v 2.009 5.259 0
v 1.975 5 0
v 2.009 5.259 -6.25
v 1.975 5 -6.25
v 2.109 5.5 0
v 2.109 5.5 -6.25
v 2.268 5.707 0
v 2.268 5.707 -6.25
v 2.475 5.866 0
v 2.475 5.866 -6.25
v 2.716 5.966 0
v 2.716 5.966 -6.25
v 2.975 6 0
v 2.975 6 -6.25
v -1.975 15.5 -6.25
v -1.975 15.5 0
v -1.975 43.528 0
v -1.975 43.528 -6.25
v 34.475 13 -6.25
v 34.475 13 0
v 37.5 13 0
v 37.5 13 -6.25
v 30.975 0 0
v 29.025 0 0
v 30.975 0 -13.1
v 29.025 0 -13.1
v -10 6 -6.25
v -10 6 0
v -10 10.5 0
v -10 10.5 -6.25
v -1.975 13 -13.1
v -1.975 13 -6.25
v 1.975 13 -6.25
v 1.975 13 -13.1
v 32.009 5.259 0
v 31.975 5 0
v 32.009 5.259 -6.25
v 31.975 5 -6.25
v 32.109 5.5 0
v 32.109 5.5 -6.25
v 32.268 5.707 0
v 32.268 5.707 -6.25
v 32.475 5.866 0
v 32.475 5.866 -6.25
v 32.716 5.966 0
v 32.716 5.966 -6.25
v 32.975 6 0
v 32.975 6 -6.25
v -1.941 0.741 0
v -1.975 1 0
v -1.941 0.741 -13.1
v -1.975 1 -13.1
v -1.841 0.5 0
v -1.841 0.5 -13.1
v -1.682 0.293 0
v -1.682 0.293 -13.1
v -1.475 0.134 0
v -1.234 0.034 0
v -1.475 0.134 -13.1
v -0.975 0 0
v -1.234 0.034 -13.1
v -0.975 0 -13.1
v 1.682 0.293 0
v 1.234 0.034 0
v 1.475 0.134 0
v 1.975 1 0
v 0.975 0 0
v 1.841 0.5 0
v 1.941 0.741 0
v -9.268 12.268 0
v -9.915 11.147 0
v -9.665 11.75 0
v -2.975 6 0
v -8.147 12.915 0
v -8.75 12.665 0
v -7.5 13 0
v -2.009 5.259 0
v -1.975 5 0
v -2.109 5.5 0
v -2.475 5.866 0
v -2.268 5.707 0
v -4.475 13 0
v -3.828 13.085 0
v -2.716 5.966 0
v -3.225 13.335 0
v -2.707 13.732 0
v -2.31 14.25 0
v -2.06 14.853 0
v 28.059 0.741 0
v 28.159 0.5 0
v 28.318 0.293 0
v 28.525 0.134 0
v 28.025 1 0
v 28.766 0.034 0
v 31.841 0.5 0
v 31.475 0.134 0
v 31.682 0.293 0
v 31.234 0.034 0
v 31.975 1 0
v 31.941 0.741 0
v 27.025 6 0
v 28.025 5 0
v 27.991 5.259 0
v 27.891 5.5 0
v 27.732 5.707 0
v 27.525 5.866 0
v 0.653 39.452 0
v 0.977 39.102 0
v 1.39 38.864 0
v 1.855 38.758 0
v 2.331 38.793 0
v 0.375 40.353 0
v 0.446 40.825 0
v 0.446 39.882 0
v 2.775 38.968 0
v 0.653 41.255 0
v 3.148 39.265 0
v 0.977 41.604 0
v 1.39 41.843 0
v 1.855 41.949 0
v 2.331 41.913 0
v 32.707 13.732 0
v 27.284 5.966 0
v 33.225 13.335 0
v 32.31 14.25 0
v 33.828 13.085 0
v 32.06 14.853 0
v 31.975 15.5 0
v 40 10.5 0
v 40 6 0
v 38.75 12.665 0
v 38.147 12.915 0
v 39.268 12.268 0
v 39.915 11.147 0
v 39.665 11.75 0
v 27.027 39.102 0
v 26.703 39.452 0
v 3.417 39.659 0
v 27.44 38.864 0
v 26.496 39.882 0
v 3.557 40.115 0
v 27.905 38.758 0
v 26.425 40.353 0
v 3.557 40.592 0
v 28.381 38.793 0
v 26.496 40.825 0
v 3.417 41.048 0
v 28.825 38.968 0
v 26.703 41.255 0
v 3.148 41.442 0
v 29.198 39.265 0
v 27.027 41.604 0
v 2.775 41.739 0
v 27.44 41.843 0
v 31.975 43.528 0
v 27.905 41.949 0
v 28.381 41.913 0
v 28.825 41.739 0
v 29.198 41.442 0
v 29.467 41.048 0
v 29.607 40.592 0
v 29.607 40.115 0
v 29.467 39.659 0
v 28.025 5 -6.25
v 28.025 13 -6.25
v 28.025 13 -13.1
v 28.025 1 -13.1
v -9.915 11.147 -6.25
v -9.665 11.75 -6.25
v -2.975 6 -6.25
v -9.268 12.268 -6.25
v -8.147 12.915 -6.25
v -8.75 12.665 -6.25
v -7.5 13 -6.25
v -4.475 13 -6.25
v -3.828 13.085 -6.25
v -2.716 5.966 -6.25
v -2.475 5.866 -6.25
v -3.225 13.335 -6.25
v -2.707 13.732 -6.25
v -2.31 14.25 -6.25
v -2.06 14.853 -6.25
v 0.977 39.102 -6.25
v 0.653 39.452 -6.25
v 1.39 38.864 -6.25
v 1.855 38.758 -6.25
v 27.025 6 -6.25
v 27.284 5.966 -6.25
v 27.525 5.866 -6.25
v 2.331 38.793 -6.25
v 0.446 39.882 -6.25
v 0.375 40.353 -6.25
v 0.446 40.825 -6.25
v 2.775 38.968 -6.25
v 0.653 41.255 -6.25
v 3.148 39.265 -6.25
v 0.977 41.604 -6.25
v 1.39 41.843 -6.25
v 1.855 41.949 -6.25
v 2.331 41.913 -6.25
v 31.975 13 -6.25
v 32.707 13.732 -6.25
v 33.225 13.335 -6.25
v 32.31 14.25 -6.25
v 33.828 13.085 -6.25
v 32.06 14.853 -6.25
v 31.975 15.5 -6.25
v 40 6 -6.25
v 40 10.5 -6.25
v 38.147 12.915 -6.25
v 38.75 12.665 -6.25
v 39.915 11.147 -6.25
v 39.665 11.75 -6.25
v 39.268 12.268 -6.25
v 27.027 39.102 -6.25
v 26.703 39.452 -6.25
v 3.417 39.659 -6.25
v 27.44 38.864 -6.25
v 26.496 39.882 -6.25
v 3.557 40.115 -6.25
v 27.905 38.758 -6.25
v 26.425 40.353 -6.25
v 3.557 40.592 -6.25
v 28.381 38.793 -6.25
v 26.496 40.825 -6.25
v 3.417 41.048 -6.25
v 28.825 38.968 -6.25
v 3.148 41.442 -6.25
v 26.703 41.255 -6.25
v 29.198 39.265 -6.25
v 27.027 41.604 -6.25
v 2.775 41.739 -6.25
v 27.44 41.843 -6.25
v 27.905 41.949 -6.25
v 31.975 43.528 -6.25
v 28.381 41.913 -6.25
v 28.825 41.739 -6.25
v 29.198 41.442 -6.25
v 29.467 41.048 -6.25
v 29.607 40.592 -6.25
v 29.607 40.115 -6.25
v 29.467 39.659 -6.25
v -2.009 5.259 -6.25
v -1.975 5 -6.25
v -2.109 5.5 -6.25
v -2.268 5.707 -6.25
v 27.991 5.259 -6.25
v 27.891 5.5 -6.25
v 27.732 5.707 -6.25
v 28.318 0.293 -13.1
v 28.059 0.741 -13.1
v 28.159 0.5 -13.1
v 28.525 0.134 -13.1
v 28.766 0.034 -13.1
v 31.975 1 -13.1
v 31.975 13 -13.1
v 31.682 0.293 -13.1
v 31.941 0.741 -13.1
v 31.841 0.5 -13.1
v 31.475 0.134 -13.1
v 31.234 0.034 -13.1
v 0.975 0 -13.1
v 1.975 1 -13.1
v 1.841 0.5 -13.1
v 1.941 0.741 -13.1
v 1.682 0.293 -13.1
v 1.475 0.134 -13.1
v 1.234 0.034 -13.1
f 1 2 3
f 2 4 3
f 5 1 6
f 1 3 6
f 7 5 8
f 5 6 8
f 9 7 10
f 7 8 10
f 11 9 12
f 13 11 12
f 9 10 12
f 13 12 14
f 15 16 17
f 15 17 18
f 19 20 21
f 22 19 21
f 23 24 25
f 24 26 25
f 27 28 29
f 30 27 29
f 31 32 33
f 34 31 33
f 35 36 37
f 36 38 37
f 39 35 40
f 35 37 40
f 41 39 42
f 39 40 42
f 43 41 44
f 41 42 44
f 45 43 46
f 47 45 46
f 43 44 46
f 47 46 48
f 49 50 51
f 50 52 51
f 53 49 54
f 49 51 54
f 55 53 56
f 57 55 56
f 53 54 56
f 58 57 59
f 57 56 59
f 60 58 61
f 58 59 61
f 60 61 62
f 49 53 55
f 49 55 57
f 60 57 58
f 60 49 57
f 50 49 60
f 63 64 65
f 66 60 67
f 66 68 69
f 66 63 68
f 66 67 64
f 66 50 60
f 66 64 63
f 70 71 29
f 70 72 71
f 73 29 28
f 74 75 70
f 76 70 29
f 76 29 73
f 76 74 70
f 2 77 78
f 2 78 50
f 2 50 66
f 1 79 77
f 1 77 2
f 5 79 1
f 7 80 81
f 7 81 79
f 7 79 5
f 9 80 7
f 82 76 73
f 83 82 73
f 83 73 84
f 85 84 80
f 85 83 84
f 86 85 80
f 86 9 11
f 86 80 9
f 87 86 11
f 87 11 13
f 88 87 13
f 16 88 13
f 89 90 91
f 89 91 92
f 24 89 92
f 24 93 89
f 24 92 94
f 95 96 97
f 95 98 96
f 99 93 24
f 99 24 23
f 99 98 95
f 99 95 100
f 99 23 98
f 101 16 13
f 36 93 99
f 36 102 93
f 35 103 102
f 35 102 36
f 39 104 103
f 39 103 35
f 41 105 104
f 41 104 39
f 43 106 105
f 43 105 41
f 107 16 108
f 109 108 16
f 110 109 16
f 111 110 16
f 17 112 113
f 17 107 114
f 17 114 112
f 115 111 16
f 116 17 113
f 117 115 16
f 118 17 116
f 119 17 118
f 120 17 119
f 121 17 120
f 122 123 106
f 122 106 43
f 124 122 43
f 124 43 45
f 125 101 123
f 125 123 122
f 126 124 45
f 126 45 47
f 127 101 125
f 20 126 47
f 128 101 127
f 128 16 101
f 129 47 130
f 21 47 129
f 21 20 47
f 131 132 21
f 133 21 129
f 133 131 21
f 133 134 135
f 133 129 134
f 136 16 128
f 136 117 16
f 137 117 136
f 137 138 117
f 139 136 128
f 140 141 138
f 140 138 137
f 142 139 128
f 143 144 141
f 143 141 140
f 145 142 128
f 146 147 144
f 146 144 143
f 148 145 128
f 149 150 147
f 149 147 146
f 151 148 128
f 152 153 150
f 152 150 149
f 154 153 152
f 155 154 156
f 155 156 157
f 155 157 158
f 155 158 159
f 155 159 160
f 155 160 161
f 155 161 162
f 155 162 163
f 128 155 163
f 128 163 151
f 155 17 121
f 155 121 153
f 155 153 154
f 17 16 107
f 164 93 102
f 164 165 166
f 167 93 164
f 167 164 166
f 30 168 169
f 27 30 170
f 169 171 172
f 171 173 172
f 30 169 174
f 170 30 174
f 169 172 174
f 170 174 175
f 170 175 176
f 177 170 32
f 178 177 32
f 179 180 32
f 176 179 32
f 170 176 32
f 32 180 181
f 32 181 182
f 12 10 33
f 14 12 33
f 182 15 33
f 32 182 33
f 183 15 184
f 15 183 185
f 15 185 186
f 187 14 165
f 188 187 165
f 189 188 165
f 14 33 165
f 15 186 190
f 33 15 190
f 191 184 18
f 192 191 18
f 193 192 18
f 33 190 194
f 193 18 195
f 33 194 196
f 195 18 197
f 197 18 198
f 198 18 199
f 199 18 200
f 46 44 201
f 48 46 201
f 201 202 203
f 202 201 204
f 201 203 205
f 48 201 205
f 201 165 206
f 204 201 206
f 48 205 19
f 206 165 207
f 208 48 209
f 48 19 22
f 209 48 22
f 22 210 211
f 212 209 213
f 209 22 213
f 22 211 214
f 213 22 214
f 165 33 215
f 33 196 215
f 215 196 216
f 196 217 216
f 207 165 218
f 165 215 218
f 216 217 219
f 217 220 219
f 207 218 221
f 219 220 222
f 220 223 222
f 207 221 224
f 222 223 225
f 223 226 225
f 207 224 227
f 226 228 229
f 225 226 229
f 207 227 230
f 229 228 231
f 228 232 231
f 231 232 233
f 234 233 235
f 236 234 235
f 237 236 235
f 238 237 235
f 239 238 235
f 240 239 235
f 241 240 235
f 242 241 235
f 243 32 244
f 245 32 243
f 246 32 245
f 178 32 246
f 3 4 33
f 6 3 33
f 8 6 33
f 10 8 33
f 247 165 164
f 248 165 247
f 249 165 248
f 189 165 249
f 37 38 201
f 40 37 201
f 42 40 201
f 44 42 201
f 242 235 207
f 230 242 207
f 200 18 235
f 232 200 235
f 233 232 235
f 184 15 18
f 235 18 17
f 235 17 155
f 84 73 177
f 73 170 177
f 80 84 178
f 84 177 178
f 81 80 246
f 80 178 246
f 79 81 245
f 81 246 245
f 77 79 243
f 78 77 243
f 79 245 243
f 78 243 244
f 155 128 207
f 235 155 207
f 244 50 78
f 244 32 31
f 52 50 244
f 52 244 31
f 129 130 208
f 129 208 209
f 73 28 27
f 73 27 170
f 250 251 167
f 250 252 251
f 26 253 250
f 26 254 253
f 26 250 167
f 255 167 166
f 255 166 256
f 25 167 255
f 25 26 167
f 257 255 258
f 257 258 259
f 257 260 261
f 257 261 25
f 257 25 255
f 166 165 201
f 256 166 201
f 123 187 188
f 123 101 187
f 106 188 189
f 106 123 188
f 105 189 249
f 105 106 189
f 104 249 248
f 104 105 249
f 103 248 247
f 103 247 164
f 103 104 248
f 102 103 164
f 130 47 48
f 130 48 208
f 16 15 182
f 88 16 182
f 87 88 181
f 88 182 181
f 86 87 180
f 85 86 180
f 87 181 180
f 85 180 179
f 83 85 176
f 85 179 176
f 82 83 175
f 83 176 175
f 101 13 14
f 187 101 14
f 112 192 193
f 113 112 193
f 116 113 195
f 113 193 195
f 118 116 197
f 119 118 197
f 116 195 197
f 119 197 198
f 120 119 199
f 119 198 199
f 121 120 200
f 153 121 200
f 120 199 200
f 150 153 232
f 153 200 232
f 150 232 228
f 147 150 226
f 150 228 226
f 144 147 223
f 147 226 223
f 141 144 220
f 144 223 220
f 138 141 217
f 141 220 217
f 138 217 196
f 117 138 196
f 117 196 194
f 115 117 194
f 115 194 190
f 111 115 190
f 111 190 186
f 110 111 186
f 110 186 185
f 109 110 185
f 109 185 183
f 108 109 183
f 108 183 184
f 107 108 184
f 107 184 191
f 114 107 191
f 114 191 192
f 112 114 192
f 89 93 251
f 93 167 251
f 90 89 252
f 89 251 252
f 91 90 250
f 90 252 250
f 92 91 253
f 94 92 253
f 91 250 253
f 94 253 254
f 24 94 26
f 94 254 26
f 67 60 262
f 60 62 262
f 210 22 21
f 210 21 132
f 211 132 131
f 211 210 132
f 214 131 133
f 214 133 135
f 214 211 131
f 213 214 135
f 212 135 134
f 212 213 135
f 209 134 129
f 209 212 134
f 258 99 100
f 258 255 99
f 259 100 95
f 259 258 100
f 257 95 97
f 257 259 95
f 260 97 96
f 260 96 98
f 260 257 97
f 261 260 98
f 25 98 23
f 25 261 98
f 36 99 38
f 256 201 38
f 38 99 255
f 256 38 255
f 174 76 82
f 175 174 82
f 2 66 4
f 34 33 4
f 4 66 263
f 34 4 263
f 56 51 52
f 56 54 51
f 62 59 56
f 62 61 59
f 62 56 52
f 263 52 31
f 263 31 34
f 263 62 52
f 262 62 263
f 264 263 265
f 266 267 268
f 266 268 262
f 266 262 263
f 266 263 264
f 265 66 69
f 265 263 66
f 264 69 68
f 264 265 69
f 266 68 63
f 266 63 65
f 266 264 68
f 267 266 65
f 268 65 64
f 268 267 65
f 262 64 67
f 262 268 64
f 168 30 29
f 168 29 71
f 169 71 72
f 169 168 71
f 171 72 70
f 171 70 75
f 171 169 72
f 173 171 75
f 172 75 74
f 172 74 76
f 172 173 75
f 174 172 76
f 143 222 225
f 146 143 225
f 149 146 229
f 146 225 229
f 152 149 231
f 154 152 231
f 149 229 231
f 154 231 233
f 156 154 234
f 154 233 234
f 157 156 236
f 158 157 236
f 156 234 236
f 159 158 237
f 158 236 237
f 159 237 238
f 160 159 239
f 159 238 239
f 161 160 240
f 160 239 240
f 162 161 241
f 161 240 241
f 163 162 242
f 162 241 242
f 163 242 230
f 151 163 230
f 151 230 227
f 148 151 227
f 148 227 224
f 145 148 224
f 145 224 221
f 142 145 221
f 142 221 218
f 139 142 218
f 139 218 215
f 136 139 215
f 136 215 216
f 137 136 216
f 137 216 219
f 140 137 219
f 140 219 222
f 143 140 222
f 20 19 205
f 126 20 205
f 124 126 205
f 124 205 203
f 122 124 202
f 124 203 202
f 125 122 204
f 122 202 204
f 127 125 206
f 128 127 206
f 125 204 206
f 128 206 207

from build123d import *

# Parameters (mm, degrees)
SKETCH1_W                  = 3.95
SKETCH1_H                  = 13.1
BOSS_EXTRUDE1_DEPTH        = 13
SKETCH2_W                  = 3.95
SKETCH2_H                  = 13.1
BOSS_EXTRUDE2_DEPTH        = 13
BOSS_EXTRUDE3_REACH        = 37.222
SKETCH3_W                  = 6.25
SKETCH3_H                  = 7
SKETCH10_W                 = 8.025
SKETCH10_H                 = 7
BOSS_EXTRUDE7_DEPTH        = 6.25
FILLET7_R                  = 1
SKETCH11_W                 = 33.95
SKETCH11_H                 = 6.25
BOSS_EXTRUDE8_DEPTH        = 30.5283
F_3_2_3_2_DIAMETER_HOLE1_D = 3.2
FILLET8_START              = -7
FILLET8_DEPTH              = 8
FILLET8_START_2            = -6.25
FILLET8_2_DEPTH            = 6.25
FILLET9_R                  = 1


with BuildPart() as part:
    # Sketch1 → Boss-Extrude1 (new body)
    with BuildSketch(Plane(origin=(0, 0, 0), x_dir=(1, 0, 0), z_dir=(0, 1, 0))):
        with Locations((0, 6.55)):
            Rectangle(SKETCH1_W, SKETCH1_H)
    extrude(amount=BOSS_EXTRUDE1_DEPTH)


with BuildPart() as body_2:
    # Sketch2 → Boss-Extrude2 (new body)
    with BuildSketch(Plane(origin=(0, 0, 0), x_dir=(1, 0, 0), z_dir=(0, 1, 0))):
        with Locations((30, 6.55)):
            Rectangle(SKETCH2_W, SKETCH2_H)
    extrude(amount=BOSS_EXTRUDE2_DEPTH)

    # Sketch3 → Boss-Extrude3 (add, up to next)
    with BuildSketch(Plane(origin=(1.975, 0, 0), x_dir=(0, 0, -1), z_dir=(1, 0, 0)), mode=Mode.PRIVATE) as boss_extrude3_sk1:
        with Locations((3.125, 9.5)):
            Rectangle(SKETCH3_W, SKETCH3_H)
    boss_extrude3_tool1 = extrude(boss_extrude3_sk1.sketch, amount=BOSS_EXTRUDE3_REACH, mode=Mode.PRIVATE) - body_2.part

    add(part.part)  # Boss-Extrude3 merges part
    add(boss_extrude3_tool1.solids().sort_by_distance((1.975, 9.5, -3.125))[0])

    # Sketch10 → Boss-Extrude7 (add)
    with BuildSketch(Plane.XY):
        with Locations((-5.9875, 9.5)):
            Rectangle(SKETCH10_W, SKETCH10_H)
        with Locations((35.9875, 9.5)):
            Rectangle(SKETCH10_W, SKETCH10_H)
    extrude(amount=-BOSS_EXTRUDE7_DEPTH)

    # Fillet7
    fillet7_edges = [body_2.edges().sort_by_distance(p)[0] for p in [
        (28.025, 0, -6.55),
        (31.975, 0, -6.55),
        (1.975, 0, -6.55),
        (-1.975, 0, -6.55),
    ]]
    fillet(fillet7_edges, radius=FILLET7_R)

    # Sketch11 → Boss-Extrude8 (add)
    with BuildSketch(Plane(origin=(0, 13, 0), x_dir=(1, 0, 0), z_dir=(0, 1, 0))):
        with Locations((15, 3.125)):
            Rectangle(SKETCH11_W, SKETCH11_H)
    extrude(amount=BOSS_EXTRUDE8_DEPTH)

    # Ø3.2 (3.2) Diameter Hole1 (through all)
    with Locations(Plane.XY):
        with Locations((28.025, 40.3533), (1.975, 40.3533)):
            Hole(F_3_2_3_2_DIAMETER_HOLE1_D / 2)

    # Fillet8: read off the stored shape, not the designer's step
    # Fillet8 outline → Fillet8 (cut)
    with BuildSketch(Plane.XY.offset(FILLET8_START)):
        with BuildLine():
            Line((40, 13), (37.5, 13))
            ThreePointArc((37.5, 13), (39.267766953, 12.267766953), (40, 10.5))
            Line((40, 10.5), (40, 13))
        make_face()
        with BuildLine():
            Line((-10, 13), (-10, 10.5))
            ThreePointArc((-10, 10.5), (-9.267766953, 12.267766953), (-7.5, 13))
            Line((-7.5, 13), (-10, 13))
        make_face()
    extrude(amount=FILLET8_DEPTH, mode=Mode.SUBTRACT)

    # Fillet8 2 outline → Fillet8 2 (add)
    with BuildSketch(Plane.XY.offset(FILLET8_START_2)):
        with BuildLine():
            Line((31.975, 13), (34.475, 13))
            ThreePointArc((34.475, 13), (32.707233047, 13.732233047), (31.975, 15.5))
            Line((31.975, 15.5), (31.975, 13))
        make_face()
        with BuildLine():
            ThreePointArc((-1.975, 15.5), (-2.707233047, 13.732233047), (-4.475, 13))
            Line((-4.475, 13), (-1.975, 13))
            Line((-1.975, 13), (-1.975, 15.5))
        make_face()
    extrude(amount=FILLET8_2_DEPTH)

    # Fillet9
    fillet9_edges = [body_2.edges().sort_by_distance(p)[0] for p in [
        (28.025, 6, -3.125),
        (1.975, 6, -3.125),
        (-1.975, 6, -3.125),
        (31.975, 6, -3.125),
    ]]
    fillet(fillet9_edges, radius=FILLET9_R)


solid = body_2.part
